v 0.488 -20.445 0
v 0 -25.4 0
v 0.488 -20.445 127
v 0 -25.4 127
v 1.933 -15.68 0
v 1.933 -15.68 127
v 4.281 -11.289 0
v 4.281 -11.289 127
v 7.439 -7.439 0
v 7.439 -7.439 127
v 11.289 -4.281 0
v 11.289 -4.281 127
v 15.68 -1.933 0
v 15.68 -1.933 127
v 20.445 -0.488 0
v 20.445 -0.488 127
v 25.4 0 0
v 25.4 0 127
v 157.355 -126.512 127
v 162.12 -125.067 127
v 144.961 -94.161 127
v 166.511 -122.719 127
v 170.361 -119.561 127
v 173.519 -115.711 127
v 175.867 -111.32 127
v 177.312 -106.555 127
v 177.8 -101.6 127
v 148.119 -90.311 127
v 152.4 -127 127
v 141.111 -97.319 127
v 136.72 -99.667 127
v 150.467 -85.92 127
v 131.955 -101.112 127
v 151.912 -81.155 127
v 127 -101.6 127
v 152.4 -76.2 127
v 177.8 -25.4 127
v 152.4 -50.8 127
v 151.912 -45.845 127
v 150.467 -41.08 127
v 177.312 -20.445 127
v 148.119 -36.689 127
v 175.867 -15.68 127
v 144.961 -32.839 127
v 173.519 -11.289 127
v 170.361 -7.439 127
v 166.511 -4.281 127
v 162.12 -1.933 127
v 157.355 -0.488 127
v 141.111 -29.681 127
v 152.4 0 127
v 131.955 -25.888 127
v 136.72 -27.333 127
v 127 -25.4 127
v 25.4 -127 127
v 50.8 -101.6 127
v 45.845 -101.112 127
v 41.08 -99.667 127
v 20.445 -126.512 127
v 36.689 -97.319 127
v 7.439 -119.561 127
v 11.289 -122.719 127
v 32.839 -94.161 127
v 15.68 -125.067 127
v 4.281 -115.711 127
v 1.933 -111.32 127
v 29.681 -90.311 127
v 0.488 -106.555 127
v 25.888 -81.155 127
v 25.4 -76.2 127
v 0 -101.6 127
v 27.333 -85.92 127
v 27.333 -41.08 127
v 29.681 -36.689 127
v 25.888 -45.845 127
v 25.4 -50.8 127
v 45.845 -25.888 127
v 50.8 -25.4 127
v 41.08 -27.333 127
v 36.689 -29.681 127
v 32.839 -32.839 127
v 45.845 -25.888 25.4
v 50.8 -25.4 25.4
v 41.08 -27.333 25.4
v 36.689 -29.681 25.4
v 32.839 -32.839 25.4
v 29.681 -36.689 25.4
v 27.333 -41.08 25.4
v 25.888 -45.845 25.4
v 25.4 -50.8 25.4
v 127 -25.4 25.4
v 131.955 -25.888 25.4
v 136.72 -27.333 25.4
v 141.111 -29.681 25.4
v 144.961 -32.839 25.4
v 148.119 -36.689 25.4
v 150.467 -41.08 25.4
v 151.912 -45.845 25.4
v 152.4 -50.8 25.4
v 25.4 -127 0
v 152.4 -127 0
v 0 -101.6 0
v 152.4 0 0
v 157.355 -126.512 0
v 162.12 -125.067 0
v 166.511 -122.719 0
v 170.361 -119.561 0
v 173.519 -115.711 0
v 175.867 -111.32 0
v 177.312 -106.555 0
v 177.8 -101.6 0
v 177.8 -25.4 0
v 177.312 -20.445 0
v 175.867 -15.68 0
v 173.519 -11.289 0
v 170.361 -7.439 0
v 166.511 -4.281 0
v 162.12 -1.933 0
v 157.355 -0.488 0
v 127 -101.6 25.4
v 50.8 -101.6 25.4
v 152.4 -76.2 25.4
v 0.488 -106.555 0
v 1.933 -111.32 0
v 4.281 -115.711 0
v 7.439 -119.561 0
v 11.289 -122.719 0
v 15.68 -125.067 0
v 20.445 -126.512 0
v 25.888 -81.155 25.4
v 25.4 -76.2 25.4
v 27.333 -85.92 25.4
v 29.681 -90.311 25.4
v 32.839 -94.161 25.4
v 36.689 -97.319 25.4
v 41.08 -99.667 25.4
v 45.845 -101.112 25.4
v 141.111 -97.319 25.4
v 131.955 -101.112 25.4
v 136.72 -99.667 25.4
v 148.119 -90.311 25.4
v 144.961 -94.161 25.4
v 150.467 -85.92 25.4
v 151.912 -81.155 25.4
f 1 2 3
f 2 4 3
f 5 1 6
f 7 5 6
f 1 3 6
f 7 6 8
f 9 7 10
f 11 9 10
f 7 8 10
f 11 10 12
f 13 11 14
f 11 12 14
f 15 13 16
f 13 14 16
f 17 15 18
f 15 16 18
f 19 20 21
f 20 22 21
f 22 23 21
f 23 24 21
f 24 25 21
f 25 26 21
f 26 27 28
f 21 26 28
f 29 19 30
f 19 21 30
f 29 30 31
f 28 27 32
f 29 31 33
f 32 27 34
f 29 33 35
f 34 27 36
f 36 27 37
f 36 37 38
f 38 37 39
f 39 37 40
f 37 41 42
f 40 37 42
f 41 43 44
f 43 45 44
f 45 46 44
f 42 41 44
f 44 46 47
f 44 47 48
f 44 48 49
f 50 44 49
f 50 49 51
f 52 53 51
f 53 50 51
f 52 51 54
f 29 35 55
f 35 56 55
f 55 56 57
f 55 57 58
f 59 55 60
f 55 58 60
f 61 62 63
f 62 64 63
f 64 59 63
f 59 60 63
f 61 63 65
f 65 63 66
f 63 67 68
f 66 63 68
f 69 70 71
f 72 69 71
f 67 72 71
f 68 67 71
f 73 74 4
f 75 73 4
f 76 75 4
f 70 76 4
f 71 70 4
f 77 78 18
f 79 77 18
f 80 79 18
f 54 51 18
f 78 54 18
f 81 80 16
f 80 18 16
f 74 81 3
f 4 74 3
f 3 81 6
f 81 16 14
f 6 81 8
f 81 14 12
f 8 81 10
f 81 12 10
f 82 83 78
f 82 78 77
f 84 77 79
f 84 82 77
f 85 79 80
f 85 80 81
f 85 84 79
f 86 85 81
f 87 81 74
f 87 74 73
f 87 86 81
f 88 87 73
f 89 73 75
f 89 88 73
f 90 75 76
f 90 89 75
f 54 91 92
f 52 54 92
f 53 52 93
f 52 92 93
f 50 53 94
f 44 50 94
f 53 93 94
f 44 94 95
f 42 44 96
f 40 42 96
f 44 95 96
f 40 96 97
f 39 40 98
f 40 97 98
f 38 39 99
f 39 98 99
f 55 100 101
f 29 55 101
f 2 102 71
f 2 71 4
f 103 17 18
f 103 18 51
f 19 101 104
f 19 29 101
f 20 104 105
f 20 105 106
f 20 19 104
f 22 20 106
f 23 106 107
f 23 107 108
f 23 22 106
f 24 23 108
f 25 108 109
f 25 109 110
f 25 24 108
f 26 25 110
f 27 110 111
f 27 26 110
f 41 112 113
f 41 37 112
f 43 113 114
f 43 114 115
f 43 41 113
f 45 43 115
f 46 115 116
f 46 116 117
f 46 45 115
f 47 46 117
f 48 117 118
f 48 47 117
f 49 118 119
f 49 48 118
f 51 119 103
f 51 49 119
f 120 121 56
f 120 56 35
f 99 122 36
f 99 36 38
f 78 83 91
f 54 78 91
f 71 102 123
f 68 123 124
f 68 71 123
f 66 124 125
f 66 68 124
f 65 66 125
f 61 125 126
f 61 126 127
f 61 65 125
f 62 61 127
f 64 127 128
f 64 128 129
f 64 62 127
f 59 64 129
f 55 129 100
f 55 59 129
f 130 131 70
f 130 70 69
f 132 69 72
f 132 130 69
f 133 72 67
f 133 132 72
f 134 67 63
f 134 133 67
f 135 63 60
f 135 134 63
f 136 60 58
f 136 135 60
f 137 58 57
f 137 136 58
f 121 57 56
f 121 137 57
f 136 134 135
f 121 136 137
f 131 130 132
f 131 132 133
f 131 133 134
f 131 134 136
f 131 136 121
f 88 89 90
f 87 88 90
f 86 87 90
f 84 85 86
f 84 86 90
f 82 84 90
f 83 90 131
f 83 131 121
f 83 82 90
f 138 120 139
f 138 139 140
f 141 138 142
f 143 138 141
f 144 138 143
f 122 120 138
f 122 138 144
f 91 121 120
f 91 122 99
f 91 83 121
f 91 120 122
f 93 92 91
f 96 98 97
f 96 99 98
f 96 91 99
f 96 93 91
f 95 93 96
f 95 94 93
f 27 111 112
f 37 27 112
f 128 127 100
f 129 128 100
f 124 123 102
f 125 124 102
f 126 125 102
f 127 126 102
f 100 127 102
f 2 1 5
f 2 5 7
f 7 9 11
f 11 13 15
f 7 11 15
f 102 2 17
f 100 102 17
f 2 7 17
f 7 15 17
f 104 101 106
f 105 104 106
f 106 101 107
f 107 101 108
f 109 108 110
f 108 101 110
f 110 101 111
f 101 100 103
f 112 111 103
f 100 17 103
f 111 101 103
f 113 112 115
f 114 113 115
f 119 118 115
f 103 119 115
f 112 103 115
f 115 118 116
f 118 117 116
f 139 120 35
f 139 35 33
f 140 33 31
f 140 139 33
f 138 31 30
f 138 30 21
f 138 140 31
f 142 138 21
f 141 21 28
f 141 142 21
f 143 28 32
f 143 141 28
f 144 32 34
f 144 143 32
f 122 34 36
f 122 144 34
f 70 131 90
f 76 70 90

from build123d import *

# Parameters (mm, degrees)
F0_W        = 177.8
F0_H        = 127
F1_DEPTH    = 127
F2_R        = 25.4
F3_T        = 25.4
F4_T1_DEPTH = 101.6


# Not quite as in the source:
# - a fillet or chamfer that OpenCascade refuses, or shapes differently, is made with other operations: its cross-section is extruded or revolved along the edge and cut away or added
# - a shell that OpenCascade refuses in one call is made with other operations: the cavity is built on its own and cut out


with BuildPart() as f1:
    # F0 (on Top) → F1 (new body)
    with BuildSketch(Plane.XY):
        with Locations((88.9, -63.5)):
            Rectangle(F0_W, F0_H)
    extrude(amount=F1_DEPTH)

    # F2
    f2_edges = [f1.edges().sort_by_distance(p)[0] for p in [
        (0, -127, 63.5),
        (177.8, -127, 63.5),
        (177.8, 0, 63.5),
        (0, 0, 63.5),
    ]]
    fillet(f2_edges, radius=F2_R)

    # F3: shell of thickness 25.4, made by hand


with BuildPart() as f3_core1:
    # F3_t2: copy of F1
    add(f1.part)

    # the walls: a layer under each face that stays
    f3_faces = [f3_core1.faces().sort_by_distance(p)[0] for p in [
        (88.9, 0, 63.5),
        (88.9, -63.5, 0),
        (177.8, -63.5, 63.5),
        (0, -63.5, 63.5),
        (88.9, -127, 63.5),
    ]]
    thicken(f3_faces, amount=-F3_T, mode=Mode.SUBTRACT)


with BuildPart() as f1_1:
    add(f1.part)

    # what is left inside the walls is the cavity
    f3_cavity = [f3_core1.part.solids().sort_by_distance(p)[0] for p in [
        (88.9, -25.654, 93.133333),
    ]]
    add(f3_cavity, mode=Mode.SUBTRACT)

    # F4: fillet of radius 25.4 on 6 edges, made by hand

    # F4_s2 → F4_t1 (join)
    with BuildSketch(Plane.XY.offset(25.4)):
        with BuildLine():
            ThreePointArc((50.8, -25.4), (32.8394877579, -32.8394877579), (25.4, -50.8))
            Line((25.4, -50.8), (25.4, -25.4))
            Line((25.4, -25.4), (50.8, -25.4))
        make_face()
        with BuildLine():
            ThreePointArc((127, -25.4), (144.9605122421, -32.8394877579), (152.4, -50.8))
            Line((152.4, -50.8), (152.4, -25.4))
            Line((152.4, -25.4), (127, -25.4))
        make_face()
        with BuildLine():
            ThreePointArc((25.4, -76.2), (32.8394877579, -94.1605122421), (50.8, -101.6))
            Line((50.8, -101.6), (25.4, -101.6))
            Line((25.4, -101.6), (25.4, -76.2))
        make_face()
        with BuildLine():
            ThreePointArc((127, -101.6), (144.9605122421, -94.1605122421), (152.4, -76.2))
            Line((152.4, -76.2), (152.4, -101.6))
            Line((152.4, -101.6), (127, -101.6))
        make_face()
    extrude(amount=F4_T1_DEPTH)


solid = f1_1.part
